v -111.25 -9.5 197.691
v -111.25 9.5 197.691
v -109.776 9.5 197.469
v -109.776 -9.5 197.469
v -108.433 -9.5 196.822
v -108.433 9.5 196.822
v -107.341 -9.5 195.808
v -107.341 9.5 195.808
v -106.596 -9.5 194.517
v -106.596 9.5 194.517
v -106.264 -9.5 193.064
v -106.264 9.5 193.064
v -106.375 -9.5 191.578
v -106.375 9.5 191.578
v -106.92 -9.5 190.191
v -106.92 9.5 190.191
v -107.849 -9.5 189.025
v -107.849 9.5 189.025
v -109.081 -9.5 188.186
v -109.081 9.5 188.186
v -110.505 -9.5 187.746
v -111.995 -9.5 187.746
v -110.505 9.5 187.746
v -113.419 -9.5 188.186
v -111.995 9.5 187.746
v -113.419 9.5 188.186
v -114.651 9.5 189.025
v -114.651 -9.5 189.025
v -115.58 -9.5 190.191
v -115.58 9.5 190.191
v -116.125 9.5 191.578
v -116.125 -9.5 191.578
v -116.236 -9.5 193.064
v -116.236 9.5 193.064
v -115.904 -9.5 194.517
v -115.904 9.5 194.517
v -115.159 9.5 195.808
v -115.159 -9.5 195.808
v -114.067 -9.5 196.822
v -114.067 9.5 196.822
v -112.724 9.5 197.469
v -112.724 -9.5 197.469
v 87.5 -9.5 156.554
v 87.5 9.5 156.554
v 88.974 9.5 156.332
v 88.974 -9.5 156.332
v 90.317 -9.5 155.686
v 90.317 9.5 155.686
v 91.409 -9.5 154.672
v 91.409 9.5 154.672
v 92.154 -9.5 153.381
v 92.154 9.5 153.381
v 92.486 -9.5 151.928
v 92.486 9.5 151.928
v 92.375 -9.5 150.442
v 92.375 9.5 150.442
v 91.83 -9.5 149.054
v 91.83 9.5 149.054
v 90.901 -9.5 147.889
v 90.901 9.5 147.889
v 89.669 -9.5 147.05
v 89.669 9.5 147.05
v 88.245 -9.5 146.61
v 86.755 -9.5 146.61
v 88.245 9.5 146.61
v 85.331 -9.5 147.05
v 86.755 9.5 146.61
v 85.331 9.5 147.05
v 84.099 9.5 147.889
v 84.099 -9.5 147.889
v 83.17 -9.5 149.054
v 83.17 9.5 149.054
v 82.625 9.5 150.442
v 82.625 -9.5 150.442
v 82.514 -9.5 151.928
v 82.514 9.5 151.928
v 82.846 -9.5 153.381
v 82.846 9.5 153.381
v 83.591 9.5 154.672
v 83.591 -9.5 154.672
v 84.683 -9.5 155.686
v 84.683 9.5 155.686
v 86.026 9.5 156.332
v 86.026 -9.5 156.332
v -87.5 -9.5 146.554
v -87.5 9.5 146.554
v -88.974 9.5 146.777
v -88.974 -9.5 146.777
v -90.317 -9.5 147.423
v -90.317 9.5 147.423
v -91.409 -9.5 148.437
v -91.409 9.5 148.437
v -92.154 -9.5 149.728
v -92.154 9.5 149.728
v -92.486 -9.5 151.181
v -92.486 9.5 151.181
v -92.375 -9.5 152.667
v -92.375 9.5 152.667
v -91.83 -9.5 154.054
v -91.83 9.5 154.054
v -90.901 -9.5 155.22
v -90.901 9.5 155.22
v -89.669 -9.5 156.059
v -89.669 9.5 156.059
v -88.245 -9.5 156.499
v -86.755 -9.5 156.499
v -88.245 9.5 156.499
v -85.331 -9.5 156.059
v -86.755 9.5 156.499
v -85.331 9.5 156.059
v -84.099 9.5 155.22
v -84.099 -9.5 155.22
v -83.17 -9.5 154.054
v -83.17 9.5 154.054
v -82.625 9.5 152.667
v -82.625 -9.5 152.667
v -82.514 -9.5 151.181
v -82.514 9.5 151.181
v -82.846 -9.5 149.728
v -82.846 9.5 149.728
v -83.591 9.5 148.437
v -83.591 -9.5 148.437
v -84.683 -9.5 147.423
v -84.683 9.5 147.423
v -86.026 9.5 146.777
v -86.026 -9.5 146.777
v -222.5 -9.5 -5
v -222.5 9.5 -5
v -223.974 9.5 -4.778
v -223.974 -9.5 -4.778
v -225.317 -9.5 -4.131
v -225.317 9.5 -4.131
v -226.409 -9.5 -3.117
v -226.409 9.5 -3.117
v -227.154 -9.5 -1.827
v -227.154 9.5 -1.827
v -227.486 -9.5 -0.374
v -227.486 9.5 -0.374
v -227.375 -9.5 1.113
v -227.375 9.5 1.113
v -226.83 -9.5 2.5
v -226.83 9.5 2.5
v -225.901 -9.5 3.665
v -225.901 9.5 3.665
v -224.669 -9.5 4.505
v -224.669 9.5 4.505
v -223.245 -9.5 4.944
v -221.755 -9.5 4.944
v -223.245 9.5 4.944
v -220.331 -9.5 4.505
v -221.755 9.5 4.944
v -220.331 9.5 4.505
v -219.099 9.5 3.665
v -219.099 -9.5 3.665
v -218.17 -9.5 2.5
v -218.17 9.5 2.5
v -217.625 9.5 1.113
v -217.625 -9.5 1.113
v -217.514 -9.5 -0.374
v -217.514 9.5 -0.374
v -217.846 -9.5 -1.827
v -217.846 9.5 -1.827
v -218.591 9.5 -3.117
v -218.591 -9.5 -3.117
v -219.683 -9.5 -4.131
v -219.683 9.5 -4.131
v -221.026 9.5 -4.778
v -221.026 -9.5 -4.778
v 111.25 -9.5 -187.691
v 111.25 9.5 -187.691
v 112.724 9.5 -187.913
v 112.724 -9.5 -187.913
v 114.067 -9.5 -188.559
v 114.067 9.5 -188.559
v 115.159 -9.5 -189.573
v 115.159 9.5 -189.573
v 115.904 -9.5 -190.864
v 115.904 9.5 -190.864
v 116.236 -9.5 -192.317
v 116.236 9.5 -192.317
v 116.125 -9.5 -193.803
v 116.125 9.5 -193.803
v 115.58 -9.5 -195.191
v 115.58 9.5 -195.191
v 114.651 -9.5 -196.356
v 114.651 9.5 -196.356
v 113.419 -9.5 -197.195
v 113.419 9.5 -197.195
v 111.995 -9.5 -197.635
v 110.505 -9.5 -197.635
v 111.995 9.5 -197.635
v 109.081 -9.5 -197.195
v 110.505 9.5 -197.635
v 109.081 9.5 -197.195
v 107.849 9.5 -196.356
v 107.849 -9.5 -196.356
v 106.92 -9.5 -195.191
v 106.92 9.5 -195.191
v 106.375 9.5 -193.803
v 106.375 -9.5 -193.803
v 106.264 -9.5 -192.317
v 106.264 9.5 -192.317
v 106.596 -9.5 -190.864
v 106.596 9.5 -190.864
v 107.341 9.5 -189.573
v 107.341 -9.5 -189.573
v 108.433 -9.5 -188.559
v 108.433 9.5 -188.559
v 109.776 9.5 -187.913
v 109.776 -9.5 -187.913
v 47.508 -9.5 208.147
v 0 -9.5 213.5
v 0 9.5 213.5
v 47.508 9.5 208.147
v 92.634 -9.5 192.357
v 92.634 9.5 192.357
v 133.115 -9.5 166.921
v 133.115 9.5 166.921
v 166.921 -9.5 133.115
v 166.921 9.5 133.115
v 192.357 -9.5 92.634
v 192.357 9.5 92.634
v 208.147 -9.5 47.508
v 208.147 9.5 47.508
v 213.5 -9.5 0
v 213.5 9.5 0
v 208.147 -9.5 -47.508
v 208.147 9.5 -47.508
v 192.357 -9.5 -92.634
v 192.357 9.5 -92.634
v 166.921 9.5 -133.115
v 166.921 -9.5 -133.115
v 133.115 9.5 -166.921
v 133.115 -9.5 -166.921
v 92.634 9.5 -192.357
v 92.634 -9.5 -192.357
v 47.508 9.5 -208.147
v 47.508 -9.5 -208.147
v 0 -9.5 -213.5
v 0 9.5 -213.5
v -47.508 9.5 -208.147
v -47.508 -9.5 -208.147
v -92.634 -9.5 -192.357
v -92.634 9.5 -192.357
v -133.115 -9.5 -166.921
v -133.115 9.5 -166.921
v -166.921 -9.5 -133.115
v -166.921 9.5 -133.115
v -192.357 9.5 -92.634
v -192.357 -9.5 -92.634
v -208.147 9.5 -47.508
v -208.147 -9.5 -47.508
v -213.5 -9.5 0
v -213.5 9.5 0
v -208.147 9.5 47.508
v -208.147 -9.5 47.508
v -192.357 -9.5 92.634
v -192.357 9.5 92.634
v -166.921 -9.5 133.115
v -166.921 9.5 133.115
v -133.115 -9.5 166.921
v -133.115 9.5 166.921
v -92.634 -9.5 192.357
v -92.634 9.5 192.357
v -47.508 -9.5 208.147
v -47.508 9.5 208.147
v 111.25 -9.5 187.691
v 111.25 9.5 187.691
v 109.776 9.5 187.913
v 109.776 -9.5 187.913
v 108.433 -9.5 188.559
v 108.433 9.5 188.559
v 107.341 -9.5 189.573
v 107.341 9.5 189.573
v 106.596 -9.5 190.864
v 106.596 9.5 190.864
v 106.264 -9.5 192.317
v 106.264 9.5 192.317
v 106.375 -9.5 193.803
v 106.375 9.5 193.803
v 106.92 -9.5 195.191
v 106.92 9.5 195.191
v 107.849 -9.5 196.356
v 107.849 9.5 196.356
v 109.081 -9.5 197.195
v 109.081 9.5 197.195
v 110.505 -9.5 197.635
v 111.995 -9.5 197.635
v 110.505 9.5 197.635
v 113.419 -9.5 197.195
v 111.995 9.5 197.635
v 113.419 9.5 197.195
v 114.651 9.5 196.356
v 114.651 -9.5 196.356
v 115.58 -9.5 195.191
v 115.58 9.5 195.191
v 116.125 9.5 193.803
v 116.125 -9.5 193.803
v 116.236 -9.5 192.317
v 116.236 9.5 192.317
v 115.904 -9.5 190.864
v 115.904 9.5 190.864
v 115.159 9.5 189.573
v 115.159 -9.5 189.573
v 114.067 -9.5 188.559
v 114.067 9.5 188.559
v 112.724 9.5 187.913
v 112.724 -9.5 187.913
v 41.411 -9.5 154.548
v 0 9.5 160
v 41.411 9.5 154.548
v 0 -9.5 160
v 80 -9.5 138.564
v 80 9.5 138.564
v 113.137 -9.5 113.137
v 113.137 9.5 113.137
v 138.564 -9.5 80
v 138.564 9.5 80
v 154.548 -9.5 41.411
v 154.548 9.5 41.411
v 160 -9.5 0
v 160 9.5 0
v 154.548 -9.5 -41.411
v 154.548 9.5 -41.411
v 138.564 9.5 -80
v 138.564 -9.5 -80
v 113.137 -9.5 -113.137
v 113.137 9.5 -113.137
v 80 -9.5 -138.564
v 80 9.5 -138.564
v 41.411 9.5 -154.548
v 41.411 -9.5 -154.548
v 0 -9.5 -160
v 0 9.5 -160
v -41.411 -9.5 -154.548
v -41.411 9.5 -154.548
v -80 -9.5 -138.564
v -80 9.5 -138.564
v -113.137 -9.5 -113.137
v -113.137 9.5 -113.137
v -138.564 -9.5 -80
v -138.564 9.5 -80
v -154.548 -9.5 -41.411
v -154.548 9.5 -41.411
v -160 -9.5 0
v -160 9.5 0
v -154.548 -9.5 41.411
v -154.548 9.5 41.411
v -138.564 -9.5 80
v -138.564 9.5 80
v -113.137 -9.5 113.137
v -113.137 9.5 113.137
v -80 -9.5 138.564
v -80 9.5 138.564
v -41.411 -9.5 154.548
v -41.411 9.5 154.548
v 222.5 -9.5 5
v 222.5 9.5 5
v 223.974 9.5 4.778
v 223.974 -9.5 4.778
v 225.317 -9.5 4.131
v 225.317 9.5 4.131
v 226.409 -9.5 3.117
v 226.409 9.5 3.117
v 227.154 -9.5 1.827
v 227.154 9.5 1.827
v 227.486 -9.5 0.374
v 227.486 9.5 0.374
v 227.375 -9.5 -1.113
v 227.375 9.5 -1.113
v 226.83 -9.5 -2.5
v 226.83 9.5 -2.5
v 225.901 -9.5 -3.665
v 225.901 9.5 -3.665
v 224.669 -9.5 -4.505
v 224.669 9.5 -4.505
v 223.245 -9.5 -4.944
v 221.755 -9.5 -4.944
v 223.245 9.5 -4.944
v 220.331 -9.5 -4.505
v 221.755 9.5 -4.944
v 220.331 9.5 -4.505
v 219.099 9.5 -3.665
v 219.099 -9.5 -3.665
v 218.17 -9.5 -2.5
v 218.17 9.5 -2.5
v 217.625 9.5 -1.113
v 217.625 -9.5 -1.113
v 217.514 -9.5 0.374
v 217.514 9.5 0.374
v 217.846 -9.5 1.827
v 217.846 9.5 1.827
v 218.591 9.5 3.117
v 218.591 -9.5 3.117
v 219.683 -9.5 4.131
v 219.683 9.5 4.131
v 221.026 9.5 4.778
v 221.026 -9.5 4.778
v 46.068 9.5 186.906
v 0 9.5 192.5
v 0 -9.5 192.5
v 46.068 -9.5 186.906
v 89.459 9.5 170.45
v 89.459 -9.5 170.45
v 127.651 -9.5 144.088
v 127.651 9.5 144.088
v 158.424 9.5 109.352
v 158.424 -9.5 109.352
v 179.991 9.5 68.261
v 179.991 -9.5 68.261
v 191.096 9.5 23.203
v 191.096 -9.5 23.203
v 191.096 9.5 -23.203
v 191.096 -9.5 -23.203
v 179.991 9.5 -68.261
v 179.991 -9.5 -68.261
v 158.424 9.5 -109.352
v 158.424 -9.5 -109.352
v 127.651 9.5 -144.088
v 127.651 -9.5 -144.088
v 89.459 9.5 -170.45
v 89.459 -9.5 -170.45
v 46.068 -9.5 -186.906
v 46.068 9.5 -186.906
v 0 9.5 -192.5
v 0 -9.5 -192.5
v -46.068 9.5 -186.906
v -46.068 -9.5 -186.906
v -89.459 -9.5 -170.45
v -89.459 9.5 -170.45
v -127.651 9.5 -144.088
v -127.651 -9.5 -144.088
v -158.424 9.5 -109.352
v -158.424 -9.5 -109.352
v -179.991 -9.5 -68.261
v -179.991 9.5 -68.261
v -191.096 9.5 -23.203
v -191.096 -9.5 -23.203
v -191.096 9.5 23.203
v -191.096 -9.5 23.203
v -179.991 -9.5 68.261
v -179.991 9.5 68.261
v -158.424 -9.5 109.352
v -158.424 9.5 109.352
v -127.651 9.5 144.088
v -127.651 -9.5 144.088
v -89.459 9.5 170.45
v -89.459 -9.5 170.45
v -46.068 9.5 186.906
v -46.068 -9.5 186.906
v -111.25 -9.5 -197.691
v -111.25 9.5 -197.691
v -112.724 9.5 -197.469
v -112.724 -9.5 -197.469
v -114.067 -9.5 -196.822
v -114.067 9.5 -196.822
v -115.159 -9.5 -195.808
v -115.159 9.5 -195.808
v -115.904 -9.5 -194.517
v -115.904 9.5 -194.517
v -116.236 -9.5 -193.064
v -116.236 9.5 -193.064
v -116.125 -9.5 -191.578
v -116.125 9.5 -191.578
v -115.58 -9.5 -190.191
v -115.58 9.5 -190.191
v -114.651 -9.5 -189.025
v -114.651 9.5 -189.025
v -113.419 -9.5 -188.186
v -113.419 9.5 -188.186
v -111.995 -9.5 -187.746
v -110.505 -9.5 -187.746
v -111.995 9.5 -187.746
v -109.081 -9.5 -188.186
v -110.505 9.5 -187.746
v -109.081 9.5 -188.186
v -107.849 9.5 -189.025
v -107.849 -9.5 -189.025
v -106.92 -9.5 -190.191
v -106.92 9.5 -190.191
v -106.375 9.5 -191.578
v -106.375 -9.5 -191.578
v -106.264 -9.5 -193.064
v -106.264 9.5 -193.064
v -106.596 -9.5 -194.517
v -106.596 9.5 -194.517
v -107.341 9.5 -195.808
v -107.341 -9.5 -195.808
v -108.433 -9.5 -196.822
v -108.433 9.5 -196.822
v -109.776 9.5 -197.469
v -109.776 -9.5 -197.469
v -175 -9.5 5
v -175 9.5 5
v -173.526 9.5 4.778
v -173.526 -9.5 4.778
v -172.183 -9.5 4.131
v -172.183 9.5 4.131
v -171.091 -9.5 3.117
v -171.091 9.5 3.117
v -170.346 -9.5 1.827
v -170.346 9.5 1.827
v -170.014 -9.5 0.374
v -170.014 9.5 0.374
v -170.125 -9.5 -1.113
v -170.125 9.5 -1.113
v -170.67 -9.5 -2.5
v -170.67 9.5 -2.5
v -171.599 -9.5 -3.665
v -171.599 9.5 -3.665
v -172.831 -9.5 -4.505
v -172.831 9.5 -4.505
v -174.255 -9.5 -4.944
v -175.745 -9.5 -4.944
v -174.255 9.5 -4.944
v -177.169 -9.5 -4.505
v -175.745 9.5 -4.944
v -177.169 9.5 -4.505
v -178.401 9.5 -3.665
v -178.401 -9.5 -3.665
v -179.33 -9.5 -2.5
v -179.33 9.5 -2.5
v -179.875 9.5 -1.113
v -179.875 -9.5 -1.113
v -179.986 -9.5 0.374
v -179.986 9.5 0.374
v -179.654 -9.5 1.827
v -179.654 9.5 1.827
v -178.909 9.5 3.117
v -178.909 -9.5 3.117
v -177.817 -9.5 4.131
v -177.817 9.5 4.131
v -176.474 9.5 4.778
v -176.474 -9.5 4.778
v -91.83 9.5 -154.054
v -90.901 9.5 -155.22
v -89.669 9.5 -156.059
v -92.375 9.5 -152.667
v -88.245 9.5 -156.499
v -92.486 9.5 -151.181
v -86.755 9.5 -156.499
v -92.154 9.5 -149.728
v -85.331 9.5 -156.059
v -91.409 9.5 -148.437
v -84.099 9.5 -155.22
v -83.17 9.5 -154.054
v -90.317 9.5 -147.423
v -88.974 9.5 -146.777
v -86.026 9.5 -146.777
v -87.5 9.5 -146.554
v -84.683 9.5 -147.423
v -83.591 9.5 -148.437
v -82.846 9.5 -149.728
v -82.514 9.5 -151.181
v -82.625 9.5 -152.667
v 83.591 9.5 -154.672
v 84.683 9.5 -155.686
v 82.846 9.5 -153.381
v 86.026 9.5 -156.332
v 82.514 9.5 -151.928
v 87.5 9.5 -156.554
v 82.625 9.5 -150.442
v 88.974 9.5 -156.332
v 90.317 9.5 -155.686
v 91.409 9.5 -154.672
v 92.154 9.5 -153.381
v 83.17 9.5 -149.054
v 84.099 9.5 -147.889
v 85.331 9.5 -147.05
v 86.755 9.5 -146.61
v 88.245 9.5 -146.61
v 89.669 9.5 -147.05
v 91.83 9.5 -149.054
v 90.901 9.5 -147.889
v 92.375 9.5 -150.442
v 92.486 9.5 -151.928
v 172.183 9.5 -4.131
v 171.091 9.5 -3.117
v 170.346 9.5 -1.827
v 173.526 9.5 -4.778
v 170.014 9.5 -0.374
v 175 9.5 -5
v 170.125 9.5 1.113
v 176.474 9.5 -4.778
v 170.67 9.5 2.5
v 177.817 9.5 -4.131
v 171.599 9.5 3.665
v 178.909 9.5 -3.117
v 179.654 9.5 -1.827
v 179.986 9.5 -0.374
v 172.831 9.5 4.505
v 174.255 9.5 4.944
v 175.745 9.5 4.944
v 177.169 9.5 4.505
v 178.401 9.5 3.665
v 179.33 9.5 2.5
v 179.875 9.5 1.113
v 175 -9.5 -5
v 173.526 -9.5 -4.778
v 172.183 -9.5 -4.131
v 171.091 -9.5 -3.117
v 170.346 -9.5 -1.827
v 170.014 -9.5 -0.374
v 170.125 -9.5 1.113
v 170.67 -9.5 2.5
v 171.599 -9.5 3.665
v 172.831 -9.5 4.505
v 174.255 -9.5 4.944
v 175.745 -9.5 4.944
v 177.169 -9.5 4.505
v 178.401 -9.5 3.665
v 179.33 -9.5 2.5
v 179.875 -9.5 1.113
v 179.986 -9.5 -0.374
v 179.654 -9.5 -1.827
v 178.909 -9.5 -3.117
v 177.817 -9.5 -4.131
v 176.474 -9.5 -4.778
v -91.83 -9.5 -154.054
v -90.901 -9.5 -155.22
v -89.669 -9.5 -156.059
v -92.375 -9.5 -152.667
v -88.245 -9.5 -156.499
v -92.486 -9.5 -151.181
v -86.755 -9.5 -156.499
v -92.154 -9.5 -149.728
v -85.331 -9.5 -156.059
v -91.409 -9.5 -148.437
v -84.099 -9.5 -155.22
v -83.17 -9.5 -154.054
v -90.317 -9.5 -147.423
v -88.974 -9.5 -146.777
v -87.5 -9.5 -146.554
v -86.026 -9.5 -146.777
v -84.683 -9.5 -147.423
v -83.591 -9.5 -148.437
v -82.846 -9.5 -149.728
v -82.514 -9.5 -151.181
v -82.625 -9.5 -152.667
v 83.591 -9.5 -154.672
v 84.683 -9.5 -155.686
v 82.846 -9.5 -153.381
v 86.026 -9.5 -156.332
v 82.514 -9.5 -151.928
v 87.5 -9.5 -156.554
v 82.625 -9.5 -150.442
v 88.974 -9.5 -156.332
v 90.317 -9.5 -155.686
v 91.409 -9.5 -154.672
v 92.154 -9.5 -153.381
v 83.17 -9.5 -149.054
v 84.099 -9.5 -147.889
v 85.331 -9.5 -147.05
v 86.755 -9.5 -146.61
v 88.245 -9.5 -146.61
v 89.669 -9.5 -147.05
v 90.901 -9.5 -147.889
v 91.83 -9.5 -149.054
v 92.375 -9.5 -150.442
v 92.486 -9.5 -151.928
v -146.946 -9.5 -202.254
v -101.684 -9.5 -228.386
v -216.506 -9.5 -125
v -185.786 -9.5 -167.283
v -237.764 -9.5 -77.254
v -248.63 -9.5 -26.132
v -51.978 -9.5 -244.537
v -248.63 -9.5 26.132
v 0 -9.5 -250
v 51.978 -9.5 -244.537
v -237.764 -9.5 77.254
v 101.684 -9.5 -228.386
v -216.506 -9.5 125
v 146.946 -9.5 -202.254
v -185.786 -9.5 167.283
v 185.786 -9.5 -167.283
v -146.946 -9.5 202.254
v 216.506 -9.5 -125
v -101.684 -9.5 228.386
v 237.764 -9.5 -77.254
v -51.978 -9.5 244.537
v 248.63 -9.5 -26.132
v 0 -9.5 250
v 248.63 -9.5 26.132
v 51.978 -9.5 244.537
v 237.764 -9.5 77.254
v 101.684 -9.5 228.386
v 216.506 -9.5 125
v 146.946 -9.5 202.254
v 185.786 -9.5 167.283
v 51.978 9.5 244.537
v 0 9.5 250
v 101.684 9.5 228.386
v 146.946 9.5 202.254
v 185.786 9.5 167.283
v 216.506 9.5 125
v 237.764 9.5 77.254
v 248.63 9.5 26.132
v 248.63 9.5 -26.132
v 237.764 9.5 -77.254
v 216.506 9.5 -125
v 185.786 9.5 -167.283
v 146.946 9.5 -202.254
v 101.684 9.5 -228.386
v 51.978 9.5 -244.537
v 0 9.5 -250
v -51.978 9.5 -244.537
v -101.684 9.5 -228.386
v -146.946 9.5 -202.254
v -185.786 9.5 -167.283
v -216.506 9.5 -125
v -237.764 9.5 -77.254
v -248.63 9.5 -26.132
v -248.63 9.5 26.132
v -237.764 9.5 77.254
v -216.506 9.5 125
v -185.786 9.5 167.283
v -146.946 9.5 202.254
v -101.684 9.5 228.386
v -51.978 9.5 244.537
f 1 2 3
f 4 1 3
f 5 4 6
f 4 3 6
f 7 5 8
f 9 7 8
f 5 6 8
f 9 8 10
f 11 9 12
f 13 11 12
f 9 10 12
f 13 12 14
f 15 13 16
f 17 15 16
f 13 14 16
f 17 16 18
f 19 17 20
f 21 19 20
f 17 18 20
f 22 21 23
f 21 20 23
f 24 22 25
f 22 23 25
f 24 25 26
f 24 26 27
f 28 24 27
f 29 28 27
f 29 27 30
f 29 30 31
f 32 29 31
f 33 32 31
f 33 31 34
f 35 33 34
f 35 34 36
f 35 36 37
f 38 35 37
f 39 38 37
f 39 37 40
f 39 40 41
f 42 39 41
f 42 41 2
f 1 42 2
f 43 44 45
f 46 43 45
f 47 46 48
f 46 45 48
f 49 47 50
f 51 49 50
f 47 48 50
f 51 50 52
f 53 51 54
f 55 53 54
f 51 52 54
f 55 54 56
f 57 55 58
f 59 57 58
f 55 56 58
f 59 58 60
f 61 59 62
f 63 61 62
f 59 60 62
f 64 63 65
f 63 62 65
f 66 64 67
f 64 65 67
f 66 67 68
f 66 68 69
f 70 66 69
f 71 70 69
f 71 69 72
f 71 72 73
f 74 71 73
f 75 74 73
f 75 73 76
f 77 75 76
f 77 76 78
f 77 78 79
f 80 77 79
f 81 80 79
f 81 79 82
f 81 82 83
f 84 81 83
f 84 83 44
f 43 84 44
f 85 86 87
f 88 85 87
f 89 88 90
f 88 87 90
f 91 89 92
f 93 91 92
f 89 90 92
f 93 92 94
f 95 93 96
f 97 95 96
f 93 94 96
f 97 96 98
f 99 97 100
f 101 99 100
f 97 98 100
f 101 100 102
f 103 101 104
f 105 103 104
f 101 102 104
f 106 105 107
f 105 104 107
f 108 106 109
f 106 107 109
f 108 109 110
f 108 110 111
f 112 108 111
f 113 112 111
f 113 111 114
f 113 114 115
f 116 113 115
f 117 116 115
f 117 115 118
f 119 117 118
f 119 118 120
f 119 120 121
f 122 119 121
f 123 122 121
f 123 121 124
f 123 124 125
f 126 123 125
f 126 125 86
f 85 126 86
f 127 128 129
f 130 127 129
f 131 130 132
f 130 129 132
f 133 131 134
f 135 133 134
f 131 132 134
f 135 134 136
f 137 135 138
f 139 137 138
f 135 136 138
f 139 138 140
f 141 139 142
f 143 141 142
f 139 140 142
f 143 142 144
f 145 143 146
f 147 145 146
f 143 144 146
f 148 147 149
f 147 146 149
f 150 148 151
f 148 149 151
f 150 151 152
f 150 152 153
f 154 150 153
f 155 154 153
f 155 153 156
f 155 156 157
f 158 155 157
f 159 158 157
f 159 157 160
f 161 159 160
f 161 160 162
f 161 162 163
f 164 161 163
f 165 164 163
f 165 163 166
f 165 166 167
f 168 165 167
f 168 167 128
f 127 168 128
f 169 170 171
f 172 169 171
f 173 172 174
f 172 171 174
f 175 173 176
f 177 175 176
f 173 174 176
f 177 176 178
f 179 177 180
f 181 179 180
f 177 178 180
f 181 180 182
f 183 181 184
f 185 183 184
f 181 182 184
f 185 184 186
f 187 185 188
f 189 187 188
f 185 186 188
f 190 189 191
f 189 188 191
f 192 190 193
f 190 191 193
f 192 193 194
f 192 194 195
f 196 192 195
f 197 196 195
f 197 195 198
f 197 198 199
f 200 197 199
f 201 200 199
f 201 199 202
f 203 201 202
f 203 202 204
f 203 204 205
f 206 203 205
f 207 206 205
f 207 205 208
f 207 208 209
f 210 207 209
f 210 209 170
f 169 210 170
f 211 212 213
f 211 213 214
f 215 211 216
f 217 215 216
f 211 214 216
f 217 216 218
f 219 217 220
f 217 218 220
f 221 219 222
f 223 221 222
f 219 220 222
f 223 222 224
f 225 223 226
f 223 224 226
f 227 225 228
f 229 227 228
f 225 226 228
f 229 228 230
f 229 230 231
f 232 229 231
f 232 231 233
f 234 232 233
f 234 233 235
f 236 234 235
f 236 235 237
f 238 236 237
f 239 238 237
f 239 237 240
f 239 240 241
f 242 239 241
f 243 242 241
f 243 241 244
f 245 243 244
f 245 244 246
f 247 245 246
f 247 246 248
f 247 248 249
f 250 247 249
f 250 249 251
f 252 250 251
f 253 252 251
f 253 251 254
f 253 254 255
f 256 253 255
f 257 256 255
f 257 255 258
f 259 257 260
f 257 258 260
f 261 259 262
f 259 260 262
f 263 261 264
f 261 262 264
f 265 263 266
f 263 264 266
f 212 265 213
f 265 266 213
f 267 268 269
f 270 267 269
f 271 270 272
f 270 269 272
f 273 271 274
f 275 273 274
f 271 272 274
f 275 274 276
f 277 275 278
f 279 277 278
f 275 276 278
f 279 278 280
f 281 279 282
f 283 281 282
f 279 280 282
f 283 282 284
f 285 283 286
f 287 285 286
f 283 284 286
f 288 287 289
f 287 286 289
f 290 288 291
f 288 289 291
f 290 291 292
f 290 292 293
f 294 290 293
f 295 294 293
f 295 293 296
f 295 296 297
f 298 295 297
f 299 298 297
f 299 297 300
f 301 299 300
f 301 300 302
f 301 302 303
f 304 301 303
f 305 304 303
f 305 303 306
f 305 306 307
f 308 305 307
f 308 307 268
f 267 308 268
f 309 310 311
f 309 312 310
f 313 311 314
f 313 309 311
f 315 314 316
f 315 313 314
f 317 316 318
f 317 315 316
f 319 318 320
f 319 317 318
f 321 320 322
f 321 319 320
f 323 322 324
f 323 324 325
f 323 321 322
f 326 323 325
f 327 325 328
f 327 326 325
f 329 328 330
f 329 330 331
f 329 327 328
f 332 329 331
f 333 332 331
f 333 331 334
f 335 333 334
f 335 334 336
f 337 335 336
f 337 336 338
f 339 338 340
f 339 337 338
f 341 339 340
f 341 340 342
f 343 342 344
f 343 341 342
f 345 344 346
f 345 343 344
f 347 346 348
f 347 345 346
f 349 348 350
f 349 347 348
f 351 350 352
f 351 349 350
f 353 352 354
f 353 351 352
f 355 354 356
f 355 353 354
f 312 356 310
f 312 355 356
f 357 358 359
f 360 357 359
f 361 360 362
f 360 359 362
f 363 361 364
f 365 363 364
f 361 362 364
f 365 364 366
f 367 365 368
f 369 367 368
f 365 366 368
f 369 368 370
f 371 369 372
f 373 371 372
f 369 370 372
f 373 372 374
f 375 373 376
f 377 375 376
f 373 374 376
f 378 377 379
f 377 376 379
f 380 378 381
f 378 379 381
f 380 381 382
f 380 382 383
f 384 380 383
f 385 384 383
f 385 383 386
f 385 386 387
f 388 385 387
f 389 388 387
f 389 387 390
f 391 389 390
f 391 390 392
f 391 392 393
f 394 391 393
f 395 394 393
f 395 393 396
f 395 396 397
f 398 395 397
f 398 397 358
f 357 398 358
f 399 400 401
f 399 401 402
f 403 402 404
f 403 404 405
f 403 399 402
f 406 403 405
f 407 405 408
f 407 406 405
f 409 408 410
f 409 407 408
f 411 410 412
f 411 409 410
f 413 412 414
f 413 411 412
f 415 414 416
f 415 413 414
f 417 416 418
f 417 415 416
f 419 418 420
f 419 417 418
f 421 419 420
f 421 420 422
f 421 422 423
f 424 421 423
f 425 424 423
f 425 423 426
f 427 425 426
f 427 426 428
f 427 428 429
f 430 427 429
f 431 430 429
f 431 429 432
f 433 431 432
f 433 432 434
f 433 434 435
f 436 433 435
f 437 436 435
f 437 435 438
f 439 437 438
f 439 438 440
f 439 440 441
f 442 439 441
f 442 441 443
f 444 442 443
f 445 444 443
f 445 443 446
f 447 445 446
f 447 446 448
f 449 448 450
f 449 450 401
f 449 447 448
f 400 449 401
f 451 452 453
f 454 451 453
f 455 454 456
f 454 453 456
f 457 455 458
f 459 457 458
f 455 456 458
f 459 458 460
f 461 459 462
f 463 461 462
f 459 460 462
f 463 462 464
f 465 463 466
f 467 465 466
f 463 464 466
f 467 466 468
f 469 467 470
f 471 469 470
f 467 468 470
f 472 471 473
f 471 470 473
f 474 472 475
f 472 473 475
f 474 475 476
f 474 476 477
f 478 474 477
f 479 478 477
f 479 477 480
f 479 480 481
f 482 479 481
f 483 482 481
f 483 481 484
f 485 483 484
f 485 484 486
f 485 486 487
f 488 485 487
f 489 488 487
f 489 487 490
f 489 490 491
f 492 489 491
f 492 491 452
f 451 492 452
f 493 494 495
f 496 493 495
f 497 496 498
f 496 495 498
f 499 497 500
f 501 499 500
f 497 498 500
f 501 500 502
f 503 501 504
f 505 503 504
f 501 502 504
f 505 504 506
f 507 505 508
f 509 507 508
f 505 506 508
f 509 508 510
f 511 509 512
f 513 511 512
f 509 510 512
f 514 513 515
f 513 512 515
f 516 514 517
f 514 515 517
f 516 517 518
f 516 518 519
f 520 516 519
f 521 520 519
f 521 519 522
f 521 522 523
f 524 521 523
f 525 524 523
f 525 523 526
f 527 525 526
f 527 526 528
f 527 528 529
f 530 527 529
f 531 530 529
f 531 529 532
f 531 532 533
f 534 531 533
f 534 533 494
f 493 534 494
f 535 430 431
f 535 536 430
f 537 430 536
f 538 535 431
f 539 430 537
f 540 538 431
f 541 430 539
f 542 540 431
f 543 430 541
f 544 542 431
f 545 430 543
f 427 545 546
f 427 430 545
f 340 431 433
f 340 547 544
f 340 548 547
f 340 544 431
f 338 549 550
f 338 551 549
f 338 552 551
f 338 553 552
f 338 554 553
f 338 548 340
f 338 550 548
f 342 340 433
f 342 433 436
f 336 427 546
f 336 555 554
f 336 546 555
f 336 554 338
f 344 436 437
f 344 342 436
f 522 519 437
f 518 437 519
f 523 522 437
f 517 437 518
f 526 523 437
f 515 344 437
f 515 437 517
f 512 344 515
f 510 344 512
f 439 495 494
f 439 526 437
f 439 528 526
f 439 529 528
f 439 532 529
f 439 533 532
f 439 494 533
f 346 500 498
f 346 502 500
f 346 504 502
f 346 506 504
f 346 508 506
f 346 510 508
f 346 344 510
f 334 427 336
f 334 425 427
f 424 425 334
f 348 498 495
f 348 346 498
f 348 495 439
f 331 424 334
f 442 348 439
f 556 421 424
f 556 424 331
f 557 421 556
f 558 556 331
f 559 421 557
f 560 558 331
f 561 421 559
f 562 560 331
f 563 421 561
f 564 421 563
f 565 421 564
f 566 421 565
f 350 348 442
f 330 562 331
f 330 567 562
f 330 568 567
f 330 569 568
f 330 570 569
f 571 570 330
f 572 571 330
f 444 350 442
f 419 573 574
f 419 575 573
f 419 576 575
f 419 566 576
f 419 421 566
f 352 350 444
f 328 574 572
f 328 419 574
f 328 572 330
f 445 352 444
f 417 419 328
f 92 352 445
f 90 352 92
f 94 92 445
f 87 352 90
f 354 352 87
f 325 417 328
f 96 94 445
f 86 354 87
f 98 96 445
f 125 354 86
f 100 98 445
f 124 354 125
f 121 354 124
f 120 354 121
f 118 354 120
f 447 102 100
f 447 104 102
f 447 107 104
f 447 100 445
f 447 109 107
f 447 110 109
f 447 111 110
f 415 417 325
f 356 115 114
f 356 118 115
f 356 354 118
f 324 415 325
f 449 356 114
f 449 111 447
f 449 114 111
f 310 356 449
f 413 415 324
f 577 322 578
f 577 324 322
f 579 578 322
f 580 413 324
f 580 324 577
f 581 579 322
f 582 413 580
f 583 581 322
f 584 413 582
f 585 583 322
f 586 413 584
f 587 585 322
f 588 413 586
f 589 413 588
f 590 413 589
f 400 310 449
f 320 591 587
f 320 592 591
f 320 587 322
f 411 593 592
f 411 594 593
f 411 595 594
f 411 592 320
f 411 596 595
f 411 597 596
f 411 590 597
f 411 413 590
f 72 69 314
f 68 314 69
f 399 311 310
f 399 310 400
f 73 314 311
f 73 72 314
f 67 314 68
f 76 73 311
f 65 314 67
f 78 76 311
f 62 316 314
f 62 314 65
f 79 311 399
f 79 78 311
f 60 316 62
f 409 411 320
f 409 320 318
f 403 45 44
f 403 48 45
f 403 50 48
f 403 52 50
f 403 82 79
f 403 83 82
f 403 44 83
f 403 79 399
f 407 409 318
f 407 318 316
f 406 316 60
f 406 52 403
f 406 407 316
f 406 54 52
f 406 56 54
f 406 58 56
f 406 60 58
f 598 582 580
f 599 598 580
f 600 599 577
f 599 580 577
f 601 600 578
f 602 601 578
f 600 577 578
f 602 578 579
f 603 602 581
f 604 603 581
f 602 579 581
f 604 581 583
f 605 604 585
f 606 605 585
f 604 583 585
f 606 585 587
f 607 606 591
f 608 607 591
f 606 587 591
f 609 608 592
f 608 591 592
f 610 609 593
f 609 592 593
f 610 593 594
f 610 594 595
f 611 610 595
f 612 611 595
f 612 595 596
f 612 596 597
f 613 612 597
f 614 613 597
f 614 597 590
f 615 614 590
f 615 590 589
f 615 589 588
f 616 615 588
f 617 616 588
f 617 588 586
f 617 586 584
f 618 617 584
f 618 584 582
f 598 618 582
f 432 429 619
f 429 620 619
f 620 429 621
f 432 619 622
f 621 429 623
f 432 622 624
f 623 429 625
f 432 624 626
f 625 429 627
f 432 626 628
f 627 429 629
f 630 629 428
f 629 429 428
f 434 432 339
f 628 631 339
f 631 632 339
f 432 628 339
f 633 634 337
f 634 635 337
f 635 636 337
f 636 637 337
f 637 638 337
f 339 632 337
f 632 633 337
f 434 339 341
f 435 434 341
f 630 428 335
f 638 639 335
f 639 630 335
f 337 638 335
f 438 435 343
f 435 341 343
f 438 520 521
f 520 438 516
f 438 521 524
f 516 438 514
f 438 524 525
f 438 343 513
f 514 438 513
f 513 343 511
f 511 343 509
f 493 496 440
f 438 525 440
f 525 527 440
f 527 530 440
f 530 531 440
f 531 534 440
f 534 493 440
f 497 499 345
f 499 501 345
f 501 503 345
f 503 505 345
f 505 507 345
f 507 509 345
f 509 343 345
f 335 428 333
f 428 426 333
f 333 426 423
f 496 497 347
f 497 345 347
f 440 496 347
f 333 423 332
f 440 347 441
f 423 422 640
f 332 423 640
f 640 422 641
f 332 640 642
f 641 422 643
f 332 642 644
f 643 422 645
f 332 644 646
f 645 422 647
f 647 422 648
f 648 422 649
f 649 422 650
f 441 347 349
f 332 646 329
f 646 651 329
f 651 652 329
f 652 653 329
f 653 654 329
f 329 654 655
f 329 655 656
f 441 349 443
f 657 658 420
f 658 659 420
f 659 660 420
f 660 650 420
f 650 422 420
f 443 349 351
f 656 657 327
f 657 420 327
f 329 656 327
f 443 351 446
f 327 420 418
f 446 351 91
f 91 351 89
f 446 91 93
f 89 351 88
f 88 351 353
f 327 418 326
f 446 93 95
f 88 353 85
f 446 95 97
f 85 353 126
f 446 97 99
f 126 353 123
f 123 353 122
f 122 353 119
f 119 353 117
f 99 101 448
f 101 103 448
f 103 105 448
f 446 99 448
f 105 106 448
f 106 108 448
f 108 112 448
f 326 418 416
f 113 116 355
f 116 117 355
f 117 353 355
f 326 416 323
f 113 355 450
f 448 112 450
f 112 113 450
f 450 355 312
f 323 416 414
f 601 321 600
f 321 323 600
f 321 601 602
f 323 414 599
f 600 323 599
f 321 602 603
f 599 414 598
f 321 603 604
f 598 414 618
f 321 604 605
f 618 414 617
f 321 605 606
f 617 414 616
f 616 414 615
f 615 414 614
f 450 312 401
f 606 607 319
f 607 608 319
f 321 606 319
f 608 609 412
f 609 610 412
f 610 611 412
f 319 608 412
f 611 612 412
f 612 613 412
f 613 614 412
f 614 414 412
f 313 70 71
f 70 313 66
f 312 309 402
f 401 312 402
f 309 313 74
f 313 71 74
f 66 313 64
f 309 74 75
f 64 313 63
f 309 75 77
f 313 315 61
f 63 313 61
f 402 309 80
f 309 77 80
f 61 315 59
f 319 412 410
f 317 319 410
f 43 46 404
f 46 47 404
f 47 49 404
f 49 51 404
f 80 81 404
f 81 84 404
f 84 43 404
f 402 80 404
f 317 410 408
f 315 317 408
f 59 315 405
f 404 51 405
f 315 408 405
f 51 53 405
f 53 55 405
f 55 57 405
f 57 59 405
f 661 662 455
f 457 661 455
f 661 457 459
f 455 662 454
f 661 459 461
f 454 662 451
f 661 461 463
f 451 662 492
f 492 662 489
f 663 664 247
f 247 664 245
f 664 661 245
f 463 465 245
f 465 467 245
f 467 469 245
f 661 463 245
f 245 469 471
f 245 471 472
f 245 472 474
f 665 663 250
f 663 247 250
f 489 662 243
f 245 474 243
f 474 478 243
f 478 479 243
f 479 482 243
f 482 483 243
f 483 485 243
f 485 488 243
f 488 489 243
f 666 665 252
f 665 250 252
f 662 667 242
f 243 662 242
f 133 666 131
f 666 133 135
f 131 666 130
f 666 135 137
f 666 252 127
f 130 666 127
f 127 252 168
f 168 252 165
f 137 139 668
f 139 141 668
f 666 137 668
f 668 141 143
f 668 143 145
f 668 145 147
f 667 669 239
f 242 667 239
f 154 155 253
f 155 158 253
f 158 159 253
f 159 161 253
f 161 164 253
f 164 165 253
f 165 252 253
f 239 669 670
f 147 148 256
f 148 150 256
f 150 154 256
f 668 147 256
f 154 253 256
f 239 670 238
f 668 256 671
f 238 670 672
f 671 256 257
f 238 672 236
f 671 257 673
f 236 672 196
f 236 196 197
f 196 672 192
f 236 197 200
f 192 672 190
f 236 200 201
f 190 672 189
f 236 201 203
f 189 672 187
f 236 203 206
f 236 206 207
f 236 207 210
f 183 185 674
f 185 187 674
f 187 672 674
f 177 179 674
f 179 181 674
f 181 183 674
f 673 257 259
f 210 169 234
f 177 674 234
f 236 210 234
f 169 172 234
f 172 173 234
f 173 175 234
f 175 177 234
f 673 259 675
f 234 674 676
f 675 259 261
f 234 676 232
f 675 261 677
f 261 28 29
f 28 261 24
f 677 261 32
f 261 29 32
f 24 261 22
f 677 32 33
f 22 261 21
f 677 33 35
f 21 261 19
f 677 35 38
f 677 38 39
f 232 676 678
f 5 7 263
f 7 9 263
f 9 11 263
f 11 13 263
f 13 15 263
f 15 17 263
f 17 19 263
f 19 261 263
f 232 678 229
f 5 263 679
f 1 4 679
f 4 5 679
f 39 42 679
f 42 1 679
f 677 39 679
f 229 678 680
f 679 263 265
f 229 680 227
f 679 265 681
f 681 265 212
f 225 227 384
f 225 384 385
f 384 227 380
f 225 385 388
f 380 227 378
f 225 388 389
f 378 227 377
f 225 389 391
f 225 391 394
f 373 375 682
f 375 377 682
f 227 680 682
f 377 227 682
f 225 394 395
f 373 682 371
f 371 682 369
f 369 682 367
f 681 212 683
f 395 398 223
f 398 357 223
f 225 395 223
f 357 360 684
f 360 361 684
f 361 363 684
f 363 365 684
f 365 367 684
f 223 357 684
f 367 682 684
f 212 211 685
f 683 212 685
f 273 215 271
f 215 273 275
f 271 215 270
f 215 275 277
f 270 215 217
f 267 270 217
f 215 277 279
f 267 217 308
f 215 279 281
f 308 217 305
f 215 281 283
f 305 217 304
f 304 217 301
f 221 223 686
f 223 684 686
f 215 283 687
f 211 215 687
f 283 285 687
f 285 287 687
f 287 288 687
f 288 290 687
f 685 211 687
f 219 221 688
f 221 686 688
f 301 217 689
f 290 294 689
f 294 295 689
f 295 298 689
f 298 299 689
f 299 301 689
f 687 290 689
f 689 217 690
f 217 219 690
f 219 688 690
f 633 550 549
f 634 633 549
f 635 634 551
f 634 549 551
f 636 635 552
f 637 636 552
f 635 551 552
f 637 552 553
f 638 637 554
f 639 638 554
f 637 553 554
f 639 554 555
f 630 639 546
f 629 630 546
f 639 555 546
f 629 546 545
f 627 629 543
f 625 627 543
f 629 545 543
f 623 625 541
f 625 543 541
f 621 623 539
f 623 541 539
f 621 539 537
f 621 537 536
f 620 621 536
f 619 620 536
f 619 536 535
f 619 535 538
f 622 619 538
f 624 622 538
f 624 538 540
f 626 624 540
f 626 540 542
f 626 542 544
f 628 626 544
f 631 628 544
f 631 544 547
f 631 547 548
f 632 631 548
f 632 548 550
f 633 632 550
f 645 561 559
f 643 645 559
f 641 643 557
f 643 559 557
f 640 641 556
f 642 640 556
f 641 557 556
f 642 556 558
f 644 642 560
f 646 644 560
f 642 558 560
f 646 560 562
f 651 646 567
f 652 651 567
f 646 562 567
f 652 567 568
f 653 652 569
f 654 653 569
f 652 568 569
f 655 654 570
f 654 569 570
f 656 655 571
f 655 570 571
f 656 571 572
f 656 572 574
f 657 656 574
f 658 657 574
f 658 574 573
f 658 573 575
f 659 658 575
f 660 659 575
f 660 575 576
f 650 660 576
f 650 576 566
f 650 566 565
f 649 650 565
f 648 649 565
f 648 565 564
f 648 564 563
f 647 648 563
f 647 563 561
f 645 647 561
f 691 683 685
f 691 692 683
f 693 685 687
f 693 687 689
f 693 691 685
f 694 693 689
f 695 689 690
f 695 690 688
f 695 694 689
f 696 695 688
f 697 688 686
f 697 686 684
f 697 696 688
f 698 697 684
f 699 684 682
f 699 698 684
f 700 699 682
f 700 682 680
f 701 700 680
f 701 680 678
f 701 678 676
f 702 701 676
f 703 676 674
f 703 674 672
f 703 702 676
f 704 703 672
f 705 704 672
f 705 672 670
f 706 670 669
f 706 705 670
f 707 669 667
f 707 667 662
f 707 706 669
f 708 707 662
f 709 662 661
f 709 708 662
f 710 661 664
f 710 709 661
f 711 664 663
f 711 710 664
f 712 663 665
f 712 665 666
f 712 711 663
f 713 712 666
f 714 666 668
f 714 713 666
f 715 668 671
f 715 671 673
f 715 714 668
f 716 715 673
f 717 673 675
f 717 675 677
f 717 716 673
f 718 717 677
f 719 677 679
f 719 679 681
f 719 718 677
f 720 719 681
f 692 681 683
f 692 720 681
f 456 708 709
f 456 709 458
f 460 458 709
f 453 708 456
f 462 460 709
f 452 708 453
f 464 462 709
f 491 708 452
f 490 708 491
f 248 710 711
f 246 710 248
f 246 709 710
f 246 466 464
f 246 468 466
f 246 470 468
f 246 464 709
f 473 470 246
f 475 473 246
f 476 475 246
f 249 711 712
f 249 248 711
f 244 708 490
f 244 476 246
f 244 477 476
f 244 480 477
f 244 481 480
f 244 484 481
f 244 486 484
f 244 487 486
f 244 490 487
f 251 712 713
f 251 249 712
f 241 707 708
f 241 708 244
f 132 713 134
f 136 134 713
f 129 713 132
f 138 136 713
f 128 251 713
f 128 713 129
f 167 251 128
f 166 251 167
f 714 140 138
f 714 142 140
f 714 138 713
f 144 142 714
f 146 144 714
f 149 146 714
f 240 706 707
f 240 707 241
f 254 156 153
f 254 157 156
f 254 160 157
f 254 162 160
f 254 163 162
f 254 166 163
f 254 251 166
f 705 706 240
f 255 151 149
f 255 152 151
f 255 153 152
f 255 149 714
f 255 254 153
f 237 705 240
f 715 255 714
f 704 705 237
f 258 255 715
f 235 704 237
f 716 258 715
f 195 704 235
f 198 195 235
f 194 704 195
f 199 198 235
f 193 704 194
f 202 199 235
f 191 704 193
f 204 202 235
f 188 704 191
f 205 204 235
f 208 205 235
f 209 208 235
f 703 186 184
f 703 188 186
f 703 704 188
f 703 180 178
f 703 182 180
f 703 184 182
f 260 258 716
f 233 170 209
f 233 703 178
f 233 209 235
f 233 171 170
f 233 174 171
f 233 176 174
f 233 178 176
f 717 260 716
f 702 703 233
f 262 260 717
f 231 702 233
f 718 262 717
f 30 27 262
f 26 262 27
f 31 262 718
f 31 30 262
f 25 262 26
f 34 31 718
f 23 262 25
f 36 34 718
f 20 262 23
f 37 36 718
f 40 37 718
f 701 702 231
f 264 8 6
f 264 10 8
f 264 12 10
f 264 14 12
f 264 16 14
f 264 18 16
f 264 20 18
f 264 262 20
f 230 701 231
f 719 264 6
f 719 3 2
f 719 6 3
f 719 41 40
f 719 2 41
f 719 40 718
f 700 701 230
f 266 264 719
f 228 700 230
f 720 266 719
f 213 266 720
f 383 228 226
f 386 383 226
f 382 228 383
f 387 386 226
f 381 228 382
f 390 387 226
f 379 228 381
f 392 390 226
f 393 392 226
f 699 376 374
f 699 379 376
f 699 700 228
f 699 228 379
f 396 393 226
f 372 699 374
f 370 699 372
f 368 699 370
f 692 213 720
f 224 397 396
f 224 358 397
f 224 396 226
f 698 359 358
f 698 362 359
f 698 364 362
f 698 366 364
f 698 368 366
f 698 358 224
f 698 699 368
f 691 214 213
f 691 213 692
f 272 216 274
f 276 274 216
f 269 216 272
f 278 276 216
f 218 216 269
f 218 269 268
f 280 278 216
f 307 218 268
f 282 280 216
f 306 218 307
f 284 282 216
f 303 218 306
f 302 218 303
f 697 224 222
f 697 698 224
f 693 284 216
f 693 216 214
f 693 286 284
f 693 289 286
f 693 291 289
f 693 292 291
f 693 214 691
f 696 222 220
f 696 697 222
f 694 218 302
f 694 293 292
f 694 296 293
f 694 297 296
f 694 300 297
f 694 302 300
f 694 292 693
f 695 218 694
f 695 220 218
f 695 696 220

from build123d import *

# Parameters (mm, degrees)
SKETCH1_R           = 250
SKETCH1_R_2         = 160
BOSS_EXTRUDE1_DEPTH = 9.5
SKETCH2_R           = 213.5
SKETCH2_R_2         = 192.5
SKETCH2_R_3         = 5
CUT_EXTRUDE1_DEPTH  = 355.063553617
SKETCH3_R           = 5
CUT_EXTRUDE2_DEPTH  = 355.063553617


with BuildPart() as part:
    # Sketch1 → Boss-Extrude1 (new, symmetric)
    with BuildSketch(Plane(origin=(0, 0, 0), x_dir=(1, 0, 0), z_dir=(0, 1, 0))):
        with Locations(Location((0, 0, 0), (0, 0, 270))):
            Circle(SKETCH1_R)
        with Locations(Location((0, 0, 0), (0, 0, 270))):
            Circle(SKETCH1_R_2, mode=Mode.SUBTRACT)
    extrude(amount=BOSS_EXTRUDE1_DEPTH, both=True)

    # Sketch2 → Cut-Extrude1 (cut, through all)
    # profile 1 of 7: a face of its own
    with BuildSketch(Plane(origin=(0, 9.5, 0), x_dir=(1, 0, 0), z_dir=(0, 1, 0))):
        with Locations(Location((0, 0, 0), (0, 0, 270))):
            Circle(SKETCH2_R)
        with Locations(Location((0, 0, 0), (0, 0, 270))):
            Circle(SKETCH2_R_2, mode=Mode.SUBTRACT)
    # profile 2 of 7: a face of its own
    with BuildSketch(Plane(origin=(0, 9.5, 0), x_dir=(1, 0, 0), z_dir=(0, 1, 0))):
        with Locations(Location((111.25, 192.690652342, 0), (0, 0, 270))):
            Circle(SKETCH2_R_3)
    # profile 3 of 7: a face of its own
    with BuildSketch(Plane(origin=(0, 9.5, 0), x_dir=(1, 0, 0), z_dir=(0, 1, 0))):
        with Locations(Location((222.5, 0, 0), (0, 0, 270))):
            Circle(SKETCH2_R_3)
    # profile 4 of 7: a face of its own
    with BuildSketch(Plane(origin=(0, 9.5, 0), x_dir=(1, 0, 0), z_dir=(0, 1, 0))):
        with Locations(Location((-222.5, 0, 0), (0, 0, 90))):
            Circle(SKETCH2_R_3)
    # profile 5 of 7: a face of its own
    with BuildSketch(Plane(origin=(0, 9.5, 0), x_dir=(1, 0, 0), z_dir=(0, 1, 0))):
        with Locations(Location((-111.25, 192.690652342, 0), (0, 0, 90))):
            Circle(SKETCH2_R_3)
    # profile 6 of 7: a face of its own
    with BuildSketch(Plane(origin=(0, 9.5, 0), x_dir=(1, 0, 0), z_dir=(0, 1, 0))):
        with Locations(Location((111.25, -192.690652342, 0), (0, 0, 90))):
            Circle(SKETCH2_R_3)
    # profile 7 of 7: a face of its own
    with BuildSketch(Plane(origin=(0, 9.5, 0), x_dir=(1, 0, 0), z_dir=(0, 1, 0))):
        with Locations(Location((-111.25, -192.690652342, 0), (0, 0, 270))):
            Circle(SKETCH2_R_3)
    extrude(amount=-CUT_EXTRUDE1_DEPTH, mode=Mode.SUBTRACT)


with BuildPart() as cut_extrude1_piece_1:
    # of the separate pieces the step leaves, piece 1, a body of its own (cut_extrude1_pieces)
    add(part.part.solids().sort_by_distance((0, -9.5, 250))[0])


with BuildPart() as cut_extrude1_piece_2:
    # of the separate pieces the step leaves, piece 2, a body of its own (cut_extrude1_pieces)
    add(part.part.solids().sort_by_distance((0, -9.5, 192.5))[0])

    # Sketch3 → Cut-Extrude2 (cut, through all)
    with BuildSketch(Plane(origin=(0, 9.5, 0), x_dir=(1, 0, 0), z_dir=(0, 1, 0))):
        with Locations(Location((-87.5, 151.554445662, 0), (0, 0, 270))):
            Circle(SKETCH3_R)
        with Locations(Location((-175, 0, 0), (0, 0, 270))):
            Circle(SKETCH3_R)
        with Locations(Location((175, 0, 0), (0, 0, 90))):
            Circle(SKETCH3_R)
        with Locations(Location((87.5, 151.554445662, 0), (0, 0, 90))):
            Circle(SKETCH3_R)
        with Locations(Location((87.5, -151.554445662, 0), (0, 0, 270))):
            Circle(SKETCH3_R)
        with Locations(Location((-87.5, -151.554445662, 0), (0, 0, 90))):
            Circle(SKETCH3_R)
    extrude(amount=-CUT_EXTRUDE2_DEPTH, mode=Mode.SUBTRACT)


solid = Compound([cut_extrude1_piece_1.part, cut_extrude1_piece_2.part])
